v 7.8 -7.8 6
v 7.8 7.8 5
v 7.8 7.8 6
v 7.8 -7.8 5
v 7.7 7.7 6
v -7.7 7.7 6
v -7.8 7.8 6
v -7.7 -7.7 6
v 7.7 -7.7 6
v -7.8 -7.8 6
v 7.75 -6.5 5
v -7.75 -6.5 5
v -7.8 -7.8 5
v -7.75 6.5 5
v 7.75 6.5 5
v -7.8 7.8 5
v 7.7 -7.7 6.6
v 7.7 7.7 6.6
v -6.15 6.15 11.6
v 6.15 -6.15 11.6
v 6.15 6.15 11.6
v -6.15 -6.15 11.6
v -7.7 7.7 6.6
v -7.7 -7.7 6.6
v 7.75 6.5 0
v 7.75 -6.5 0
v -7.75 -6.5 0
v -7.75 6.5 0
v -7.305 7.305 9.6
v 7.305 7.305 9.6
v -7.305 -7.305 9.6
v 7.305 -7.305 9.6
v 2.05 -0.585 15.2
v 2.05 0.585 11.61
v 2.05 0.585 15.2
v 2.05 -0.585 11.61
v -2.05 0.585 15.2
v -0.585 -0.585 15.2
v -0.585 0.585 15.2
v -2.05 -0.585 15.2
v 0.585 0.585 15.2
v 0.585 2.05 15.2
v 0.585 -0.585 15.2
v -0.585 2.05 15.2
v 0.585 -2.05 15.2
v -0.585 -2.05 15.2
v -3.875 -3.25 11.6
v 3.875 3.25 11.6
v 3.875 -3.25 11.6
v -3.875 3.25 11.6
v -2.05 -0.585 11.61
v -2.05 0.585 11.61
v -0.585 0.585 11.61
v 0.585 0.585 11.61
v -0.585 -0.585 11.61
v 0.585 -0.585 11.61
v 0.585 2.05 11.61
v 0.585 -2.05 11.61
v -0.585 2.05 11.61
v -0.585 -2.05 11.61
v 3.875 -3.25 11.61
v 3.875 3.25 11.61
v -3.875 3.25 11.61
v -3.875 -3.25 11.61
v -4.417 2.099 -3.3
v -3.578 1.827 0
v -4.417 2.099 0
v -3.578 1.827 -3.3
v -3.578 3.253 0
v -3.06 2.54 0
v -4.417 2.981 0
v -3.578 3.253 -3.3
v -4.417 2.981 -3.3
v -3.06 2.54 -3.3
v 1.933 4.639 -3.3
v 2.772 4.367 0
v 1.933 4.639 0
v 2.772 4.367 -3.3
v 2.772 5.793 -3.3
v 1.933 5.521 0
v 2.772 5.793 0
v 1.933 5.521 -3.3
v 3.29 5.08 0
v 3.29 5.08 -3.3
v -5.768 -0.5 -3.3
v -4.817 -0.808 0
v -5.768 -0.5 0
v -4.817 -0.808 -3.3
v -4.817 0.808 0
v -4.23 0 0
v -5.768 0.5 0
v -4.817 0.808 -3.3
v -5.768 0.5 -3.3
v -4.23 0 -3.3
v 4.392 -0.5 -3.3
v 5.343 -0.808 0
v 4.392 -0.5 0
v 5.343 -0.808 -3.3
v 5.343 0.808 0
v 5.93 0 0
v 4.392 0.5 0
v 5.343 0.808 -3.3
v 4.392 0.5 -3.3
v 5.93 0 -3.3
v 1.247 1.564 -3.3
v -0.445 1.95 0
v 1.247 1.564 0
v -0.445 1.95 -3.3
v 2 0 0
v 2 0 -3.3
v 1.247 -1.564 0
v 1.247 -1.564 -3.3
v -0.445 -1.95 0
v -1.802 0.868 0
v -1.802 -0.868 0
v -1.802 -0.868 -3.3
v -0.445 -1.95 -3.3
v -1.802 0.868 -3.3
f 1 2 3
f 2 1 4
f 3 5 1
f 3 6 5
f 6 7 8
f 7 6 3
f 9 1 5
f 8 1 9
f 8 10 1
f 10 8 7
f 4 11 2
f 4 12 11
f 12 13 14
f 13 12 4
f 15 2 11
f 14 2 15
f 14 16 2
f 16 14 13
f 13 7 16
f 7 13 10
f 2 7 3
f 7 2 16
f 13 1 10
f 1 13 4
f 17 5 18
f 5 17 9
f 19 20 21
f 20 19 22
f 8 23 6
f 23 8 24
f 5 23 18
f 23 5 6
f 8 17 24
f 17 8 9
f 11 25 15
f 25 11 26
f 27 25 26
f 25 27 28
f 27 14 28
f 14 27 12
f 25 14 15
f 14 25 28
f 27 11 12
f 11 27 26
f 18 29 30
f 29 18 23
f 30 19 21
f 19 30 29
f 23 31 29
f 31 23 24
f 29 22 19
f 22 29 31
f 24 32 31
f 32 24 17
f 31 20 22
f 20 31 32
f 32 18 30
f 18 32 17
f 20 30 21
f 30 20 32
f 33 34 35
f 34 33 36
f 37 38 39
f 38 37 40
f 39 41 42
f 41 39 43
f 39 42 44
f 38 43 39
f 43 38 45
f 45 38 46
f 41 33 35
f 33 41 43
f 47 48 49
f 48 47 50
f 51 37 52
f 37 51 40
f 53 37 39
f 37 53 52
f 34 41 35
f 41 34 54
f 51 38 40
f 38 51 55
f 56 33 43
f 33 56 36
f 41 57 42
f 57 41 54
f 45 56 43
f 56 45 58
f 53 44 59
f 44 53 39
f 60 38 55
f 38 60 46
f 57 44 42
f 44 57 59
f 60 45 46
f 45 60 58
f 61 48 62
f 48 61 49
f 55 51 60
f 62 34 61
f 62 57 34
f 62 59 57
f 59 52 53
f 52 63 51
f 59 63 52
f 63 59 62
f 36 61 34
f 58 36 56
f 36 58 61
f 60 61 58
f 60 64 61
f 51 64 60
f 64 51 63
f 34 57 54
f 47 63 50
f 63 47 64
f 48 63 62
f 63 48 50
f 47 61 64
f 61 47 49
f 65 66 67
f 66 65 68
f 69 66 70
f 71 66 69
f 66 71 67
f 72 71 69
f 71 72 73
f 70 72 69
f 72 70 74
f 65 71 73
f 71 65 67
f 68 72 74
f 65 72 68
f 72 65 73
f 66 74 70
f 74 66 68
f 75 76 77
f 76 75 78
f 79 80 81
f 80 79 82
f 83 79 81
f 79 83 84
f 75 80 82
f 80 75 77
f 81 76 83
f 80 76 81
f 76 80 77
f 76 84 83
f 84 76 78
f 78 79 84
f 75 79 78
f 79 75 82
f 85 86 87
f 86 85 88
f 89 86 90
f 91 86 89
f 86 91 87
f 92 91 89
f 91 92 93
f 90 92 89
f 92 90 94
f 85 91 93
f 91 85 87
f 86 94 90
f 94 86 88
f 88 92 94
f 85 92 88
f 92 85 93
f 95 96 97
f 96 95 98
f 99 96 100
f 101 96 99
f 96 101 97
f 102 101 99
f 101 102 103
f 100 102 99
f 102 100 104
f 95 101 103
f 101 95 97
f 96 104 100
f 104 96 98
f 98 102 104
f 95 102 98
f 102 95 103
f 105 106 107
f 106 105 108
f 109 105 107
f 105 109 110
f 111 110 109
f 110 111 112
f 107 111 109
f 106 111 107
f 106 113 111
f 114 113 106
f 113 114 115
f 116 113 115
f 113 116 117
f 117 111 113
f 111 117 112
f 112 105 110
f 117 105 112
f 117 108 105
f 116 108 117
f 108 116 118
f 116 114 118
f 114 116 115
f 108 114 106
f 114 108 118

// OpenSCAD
e = 0.01;
// socket_dx = 15.5;
// socket_dy = 13;
// socket_dz = 1;
// *translate([-socket_dx/2, -socket_dy/2, 3]) {
//   cube([socket_dx, socket_dy, socket_dz+e]);
// }

cherrymx(pcb_pins=true);

module cherrymx(pcb_pins=false) {
  body_dx = 15.5;
  body_dy = 13;
  body_dz = 11.6;
  body_lower_dz = 5;
  body_upper_dx = 15.4;
  body_upper_dy = 15.4;
  body_upper_dz = body_dz - body_lower_dz;

  seat_dx = 15.6;
  seat_dy = 15.6;
  seat_dz = 1;
  seat_z = 5;

  connector_thickness = 1.17;
  connector_width = 4.1;
  connector_dz = 3.6;

  body_color = [30/255, 30/255, 30/255];
  connector_color = [168/255, 29/255, 10/255];

  color(body_color) {
    difference() {
      union() {
        // Lower body
        translate([-body_dx/2, -body_dy/2, 0]) {
          cube([body_dx, body_dy, body_lower_dz]);
        }
        // Upper body
        translate([0, 0, seat_z]) {
          // Seat
          translate([-seat_dx/2, -seat_dy/2, 0]) {
            cube([seat_dx, seat_dy, seat_dz]);
          }
          // Upper body
          translate([-body_upper_dx/2, -body_upper_dy/2, 0]) {
            cube([body_upper_dx, body_upper_dy, body_upper_dz]);
          }
        }
      }
      // Keycap subtraction
      union() {
        keycap_outset = 7.7;
        keycap_travel_dz = -4;
        keycap_z = -1;
        keycap_lower_inclination = 7.5;
        for (i = [0:90:270]) {
          rotate([0, 0, i]) {
            translate([-body_dx/2-e, keycap_outset, body_dz+keycap_travel_dz+keycap_z]) {
              rotate([keycap_lower_inclination, 0, 0]) {
                cube([body_dx+2*e, body_dx/2, 2*body_dz]);
              }
              translate([0, -3*tan(keycap_lower_inclination), 3]) {
                rotate([30, 0, 0]) {
                  cube([body_dx+2*e, body_dx/2, 2*body_dz]);
                }
              }
            }
          }
        }
      }
    }
  }
  // Top connector
  color(connector_color) {
    translate([0, 0, body_dz]) {
      translate([-connector_width/2, -connector_thickness/2, 0]) {
        cube([connector_width, connector_thickness, connector_dz]);
      }
      translate([-connector_thickness/2, -connector_width/2, 0]) {
        cube([connector_thickness, connector_width, connector_dz]);
      }
      translate([-body_dx/4, -body_dy/4, 0]) {
        cube([body_dx/2, body_dy/2, e]);
      }
    }
  }
  // PINS
  // Center pin
  pin_dz = 3.3;
  center_pin_dia = 4;

  wire_pin_dia = 1.5;
  wire_pin_1_coords = [-3.81, 2.54, 0];
  wire_pin_2_coords = [2.54, 5.08, 0];
  wire_pin_color = [130/255, 130/255, 130/255];

  pcb_pin_dia = 1.7;
  pcb_pin_1_coords = [-5.08, 0, 0];
  pcb_pin_2_coords = [5.08, 0, 0];
  translate([0, 0, -pin_dz]) {
    color(body_color) cylinder(h=pin_dz, d=center_pin_dia);
    color(wire_pin_color) {
      translate(wire_pin_1_coords) cylinder(h=pin_dz, d=wire_pin_dia);
      translate(wire_pin_2_coords) cylinder(h=pin_dz, d=wire_pin_dia);
    }
    if (pcb_pins) {
      color(body_color) {
        translate(pcb_pin_1_coords) cylinder(h=pin_dz, d=pcb_pin_dia);
        translate(pcb_pin_2_coords) cylinder(h=pin_dz, d=pcb_pin_dia);
      }
    }
  }
}
